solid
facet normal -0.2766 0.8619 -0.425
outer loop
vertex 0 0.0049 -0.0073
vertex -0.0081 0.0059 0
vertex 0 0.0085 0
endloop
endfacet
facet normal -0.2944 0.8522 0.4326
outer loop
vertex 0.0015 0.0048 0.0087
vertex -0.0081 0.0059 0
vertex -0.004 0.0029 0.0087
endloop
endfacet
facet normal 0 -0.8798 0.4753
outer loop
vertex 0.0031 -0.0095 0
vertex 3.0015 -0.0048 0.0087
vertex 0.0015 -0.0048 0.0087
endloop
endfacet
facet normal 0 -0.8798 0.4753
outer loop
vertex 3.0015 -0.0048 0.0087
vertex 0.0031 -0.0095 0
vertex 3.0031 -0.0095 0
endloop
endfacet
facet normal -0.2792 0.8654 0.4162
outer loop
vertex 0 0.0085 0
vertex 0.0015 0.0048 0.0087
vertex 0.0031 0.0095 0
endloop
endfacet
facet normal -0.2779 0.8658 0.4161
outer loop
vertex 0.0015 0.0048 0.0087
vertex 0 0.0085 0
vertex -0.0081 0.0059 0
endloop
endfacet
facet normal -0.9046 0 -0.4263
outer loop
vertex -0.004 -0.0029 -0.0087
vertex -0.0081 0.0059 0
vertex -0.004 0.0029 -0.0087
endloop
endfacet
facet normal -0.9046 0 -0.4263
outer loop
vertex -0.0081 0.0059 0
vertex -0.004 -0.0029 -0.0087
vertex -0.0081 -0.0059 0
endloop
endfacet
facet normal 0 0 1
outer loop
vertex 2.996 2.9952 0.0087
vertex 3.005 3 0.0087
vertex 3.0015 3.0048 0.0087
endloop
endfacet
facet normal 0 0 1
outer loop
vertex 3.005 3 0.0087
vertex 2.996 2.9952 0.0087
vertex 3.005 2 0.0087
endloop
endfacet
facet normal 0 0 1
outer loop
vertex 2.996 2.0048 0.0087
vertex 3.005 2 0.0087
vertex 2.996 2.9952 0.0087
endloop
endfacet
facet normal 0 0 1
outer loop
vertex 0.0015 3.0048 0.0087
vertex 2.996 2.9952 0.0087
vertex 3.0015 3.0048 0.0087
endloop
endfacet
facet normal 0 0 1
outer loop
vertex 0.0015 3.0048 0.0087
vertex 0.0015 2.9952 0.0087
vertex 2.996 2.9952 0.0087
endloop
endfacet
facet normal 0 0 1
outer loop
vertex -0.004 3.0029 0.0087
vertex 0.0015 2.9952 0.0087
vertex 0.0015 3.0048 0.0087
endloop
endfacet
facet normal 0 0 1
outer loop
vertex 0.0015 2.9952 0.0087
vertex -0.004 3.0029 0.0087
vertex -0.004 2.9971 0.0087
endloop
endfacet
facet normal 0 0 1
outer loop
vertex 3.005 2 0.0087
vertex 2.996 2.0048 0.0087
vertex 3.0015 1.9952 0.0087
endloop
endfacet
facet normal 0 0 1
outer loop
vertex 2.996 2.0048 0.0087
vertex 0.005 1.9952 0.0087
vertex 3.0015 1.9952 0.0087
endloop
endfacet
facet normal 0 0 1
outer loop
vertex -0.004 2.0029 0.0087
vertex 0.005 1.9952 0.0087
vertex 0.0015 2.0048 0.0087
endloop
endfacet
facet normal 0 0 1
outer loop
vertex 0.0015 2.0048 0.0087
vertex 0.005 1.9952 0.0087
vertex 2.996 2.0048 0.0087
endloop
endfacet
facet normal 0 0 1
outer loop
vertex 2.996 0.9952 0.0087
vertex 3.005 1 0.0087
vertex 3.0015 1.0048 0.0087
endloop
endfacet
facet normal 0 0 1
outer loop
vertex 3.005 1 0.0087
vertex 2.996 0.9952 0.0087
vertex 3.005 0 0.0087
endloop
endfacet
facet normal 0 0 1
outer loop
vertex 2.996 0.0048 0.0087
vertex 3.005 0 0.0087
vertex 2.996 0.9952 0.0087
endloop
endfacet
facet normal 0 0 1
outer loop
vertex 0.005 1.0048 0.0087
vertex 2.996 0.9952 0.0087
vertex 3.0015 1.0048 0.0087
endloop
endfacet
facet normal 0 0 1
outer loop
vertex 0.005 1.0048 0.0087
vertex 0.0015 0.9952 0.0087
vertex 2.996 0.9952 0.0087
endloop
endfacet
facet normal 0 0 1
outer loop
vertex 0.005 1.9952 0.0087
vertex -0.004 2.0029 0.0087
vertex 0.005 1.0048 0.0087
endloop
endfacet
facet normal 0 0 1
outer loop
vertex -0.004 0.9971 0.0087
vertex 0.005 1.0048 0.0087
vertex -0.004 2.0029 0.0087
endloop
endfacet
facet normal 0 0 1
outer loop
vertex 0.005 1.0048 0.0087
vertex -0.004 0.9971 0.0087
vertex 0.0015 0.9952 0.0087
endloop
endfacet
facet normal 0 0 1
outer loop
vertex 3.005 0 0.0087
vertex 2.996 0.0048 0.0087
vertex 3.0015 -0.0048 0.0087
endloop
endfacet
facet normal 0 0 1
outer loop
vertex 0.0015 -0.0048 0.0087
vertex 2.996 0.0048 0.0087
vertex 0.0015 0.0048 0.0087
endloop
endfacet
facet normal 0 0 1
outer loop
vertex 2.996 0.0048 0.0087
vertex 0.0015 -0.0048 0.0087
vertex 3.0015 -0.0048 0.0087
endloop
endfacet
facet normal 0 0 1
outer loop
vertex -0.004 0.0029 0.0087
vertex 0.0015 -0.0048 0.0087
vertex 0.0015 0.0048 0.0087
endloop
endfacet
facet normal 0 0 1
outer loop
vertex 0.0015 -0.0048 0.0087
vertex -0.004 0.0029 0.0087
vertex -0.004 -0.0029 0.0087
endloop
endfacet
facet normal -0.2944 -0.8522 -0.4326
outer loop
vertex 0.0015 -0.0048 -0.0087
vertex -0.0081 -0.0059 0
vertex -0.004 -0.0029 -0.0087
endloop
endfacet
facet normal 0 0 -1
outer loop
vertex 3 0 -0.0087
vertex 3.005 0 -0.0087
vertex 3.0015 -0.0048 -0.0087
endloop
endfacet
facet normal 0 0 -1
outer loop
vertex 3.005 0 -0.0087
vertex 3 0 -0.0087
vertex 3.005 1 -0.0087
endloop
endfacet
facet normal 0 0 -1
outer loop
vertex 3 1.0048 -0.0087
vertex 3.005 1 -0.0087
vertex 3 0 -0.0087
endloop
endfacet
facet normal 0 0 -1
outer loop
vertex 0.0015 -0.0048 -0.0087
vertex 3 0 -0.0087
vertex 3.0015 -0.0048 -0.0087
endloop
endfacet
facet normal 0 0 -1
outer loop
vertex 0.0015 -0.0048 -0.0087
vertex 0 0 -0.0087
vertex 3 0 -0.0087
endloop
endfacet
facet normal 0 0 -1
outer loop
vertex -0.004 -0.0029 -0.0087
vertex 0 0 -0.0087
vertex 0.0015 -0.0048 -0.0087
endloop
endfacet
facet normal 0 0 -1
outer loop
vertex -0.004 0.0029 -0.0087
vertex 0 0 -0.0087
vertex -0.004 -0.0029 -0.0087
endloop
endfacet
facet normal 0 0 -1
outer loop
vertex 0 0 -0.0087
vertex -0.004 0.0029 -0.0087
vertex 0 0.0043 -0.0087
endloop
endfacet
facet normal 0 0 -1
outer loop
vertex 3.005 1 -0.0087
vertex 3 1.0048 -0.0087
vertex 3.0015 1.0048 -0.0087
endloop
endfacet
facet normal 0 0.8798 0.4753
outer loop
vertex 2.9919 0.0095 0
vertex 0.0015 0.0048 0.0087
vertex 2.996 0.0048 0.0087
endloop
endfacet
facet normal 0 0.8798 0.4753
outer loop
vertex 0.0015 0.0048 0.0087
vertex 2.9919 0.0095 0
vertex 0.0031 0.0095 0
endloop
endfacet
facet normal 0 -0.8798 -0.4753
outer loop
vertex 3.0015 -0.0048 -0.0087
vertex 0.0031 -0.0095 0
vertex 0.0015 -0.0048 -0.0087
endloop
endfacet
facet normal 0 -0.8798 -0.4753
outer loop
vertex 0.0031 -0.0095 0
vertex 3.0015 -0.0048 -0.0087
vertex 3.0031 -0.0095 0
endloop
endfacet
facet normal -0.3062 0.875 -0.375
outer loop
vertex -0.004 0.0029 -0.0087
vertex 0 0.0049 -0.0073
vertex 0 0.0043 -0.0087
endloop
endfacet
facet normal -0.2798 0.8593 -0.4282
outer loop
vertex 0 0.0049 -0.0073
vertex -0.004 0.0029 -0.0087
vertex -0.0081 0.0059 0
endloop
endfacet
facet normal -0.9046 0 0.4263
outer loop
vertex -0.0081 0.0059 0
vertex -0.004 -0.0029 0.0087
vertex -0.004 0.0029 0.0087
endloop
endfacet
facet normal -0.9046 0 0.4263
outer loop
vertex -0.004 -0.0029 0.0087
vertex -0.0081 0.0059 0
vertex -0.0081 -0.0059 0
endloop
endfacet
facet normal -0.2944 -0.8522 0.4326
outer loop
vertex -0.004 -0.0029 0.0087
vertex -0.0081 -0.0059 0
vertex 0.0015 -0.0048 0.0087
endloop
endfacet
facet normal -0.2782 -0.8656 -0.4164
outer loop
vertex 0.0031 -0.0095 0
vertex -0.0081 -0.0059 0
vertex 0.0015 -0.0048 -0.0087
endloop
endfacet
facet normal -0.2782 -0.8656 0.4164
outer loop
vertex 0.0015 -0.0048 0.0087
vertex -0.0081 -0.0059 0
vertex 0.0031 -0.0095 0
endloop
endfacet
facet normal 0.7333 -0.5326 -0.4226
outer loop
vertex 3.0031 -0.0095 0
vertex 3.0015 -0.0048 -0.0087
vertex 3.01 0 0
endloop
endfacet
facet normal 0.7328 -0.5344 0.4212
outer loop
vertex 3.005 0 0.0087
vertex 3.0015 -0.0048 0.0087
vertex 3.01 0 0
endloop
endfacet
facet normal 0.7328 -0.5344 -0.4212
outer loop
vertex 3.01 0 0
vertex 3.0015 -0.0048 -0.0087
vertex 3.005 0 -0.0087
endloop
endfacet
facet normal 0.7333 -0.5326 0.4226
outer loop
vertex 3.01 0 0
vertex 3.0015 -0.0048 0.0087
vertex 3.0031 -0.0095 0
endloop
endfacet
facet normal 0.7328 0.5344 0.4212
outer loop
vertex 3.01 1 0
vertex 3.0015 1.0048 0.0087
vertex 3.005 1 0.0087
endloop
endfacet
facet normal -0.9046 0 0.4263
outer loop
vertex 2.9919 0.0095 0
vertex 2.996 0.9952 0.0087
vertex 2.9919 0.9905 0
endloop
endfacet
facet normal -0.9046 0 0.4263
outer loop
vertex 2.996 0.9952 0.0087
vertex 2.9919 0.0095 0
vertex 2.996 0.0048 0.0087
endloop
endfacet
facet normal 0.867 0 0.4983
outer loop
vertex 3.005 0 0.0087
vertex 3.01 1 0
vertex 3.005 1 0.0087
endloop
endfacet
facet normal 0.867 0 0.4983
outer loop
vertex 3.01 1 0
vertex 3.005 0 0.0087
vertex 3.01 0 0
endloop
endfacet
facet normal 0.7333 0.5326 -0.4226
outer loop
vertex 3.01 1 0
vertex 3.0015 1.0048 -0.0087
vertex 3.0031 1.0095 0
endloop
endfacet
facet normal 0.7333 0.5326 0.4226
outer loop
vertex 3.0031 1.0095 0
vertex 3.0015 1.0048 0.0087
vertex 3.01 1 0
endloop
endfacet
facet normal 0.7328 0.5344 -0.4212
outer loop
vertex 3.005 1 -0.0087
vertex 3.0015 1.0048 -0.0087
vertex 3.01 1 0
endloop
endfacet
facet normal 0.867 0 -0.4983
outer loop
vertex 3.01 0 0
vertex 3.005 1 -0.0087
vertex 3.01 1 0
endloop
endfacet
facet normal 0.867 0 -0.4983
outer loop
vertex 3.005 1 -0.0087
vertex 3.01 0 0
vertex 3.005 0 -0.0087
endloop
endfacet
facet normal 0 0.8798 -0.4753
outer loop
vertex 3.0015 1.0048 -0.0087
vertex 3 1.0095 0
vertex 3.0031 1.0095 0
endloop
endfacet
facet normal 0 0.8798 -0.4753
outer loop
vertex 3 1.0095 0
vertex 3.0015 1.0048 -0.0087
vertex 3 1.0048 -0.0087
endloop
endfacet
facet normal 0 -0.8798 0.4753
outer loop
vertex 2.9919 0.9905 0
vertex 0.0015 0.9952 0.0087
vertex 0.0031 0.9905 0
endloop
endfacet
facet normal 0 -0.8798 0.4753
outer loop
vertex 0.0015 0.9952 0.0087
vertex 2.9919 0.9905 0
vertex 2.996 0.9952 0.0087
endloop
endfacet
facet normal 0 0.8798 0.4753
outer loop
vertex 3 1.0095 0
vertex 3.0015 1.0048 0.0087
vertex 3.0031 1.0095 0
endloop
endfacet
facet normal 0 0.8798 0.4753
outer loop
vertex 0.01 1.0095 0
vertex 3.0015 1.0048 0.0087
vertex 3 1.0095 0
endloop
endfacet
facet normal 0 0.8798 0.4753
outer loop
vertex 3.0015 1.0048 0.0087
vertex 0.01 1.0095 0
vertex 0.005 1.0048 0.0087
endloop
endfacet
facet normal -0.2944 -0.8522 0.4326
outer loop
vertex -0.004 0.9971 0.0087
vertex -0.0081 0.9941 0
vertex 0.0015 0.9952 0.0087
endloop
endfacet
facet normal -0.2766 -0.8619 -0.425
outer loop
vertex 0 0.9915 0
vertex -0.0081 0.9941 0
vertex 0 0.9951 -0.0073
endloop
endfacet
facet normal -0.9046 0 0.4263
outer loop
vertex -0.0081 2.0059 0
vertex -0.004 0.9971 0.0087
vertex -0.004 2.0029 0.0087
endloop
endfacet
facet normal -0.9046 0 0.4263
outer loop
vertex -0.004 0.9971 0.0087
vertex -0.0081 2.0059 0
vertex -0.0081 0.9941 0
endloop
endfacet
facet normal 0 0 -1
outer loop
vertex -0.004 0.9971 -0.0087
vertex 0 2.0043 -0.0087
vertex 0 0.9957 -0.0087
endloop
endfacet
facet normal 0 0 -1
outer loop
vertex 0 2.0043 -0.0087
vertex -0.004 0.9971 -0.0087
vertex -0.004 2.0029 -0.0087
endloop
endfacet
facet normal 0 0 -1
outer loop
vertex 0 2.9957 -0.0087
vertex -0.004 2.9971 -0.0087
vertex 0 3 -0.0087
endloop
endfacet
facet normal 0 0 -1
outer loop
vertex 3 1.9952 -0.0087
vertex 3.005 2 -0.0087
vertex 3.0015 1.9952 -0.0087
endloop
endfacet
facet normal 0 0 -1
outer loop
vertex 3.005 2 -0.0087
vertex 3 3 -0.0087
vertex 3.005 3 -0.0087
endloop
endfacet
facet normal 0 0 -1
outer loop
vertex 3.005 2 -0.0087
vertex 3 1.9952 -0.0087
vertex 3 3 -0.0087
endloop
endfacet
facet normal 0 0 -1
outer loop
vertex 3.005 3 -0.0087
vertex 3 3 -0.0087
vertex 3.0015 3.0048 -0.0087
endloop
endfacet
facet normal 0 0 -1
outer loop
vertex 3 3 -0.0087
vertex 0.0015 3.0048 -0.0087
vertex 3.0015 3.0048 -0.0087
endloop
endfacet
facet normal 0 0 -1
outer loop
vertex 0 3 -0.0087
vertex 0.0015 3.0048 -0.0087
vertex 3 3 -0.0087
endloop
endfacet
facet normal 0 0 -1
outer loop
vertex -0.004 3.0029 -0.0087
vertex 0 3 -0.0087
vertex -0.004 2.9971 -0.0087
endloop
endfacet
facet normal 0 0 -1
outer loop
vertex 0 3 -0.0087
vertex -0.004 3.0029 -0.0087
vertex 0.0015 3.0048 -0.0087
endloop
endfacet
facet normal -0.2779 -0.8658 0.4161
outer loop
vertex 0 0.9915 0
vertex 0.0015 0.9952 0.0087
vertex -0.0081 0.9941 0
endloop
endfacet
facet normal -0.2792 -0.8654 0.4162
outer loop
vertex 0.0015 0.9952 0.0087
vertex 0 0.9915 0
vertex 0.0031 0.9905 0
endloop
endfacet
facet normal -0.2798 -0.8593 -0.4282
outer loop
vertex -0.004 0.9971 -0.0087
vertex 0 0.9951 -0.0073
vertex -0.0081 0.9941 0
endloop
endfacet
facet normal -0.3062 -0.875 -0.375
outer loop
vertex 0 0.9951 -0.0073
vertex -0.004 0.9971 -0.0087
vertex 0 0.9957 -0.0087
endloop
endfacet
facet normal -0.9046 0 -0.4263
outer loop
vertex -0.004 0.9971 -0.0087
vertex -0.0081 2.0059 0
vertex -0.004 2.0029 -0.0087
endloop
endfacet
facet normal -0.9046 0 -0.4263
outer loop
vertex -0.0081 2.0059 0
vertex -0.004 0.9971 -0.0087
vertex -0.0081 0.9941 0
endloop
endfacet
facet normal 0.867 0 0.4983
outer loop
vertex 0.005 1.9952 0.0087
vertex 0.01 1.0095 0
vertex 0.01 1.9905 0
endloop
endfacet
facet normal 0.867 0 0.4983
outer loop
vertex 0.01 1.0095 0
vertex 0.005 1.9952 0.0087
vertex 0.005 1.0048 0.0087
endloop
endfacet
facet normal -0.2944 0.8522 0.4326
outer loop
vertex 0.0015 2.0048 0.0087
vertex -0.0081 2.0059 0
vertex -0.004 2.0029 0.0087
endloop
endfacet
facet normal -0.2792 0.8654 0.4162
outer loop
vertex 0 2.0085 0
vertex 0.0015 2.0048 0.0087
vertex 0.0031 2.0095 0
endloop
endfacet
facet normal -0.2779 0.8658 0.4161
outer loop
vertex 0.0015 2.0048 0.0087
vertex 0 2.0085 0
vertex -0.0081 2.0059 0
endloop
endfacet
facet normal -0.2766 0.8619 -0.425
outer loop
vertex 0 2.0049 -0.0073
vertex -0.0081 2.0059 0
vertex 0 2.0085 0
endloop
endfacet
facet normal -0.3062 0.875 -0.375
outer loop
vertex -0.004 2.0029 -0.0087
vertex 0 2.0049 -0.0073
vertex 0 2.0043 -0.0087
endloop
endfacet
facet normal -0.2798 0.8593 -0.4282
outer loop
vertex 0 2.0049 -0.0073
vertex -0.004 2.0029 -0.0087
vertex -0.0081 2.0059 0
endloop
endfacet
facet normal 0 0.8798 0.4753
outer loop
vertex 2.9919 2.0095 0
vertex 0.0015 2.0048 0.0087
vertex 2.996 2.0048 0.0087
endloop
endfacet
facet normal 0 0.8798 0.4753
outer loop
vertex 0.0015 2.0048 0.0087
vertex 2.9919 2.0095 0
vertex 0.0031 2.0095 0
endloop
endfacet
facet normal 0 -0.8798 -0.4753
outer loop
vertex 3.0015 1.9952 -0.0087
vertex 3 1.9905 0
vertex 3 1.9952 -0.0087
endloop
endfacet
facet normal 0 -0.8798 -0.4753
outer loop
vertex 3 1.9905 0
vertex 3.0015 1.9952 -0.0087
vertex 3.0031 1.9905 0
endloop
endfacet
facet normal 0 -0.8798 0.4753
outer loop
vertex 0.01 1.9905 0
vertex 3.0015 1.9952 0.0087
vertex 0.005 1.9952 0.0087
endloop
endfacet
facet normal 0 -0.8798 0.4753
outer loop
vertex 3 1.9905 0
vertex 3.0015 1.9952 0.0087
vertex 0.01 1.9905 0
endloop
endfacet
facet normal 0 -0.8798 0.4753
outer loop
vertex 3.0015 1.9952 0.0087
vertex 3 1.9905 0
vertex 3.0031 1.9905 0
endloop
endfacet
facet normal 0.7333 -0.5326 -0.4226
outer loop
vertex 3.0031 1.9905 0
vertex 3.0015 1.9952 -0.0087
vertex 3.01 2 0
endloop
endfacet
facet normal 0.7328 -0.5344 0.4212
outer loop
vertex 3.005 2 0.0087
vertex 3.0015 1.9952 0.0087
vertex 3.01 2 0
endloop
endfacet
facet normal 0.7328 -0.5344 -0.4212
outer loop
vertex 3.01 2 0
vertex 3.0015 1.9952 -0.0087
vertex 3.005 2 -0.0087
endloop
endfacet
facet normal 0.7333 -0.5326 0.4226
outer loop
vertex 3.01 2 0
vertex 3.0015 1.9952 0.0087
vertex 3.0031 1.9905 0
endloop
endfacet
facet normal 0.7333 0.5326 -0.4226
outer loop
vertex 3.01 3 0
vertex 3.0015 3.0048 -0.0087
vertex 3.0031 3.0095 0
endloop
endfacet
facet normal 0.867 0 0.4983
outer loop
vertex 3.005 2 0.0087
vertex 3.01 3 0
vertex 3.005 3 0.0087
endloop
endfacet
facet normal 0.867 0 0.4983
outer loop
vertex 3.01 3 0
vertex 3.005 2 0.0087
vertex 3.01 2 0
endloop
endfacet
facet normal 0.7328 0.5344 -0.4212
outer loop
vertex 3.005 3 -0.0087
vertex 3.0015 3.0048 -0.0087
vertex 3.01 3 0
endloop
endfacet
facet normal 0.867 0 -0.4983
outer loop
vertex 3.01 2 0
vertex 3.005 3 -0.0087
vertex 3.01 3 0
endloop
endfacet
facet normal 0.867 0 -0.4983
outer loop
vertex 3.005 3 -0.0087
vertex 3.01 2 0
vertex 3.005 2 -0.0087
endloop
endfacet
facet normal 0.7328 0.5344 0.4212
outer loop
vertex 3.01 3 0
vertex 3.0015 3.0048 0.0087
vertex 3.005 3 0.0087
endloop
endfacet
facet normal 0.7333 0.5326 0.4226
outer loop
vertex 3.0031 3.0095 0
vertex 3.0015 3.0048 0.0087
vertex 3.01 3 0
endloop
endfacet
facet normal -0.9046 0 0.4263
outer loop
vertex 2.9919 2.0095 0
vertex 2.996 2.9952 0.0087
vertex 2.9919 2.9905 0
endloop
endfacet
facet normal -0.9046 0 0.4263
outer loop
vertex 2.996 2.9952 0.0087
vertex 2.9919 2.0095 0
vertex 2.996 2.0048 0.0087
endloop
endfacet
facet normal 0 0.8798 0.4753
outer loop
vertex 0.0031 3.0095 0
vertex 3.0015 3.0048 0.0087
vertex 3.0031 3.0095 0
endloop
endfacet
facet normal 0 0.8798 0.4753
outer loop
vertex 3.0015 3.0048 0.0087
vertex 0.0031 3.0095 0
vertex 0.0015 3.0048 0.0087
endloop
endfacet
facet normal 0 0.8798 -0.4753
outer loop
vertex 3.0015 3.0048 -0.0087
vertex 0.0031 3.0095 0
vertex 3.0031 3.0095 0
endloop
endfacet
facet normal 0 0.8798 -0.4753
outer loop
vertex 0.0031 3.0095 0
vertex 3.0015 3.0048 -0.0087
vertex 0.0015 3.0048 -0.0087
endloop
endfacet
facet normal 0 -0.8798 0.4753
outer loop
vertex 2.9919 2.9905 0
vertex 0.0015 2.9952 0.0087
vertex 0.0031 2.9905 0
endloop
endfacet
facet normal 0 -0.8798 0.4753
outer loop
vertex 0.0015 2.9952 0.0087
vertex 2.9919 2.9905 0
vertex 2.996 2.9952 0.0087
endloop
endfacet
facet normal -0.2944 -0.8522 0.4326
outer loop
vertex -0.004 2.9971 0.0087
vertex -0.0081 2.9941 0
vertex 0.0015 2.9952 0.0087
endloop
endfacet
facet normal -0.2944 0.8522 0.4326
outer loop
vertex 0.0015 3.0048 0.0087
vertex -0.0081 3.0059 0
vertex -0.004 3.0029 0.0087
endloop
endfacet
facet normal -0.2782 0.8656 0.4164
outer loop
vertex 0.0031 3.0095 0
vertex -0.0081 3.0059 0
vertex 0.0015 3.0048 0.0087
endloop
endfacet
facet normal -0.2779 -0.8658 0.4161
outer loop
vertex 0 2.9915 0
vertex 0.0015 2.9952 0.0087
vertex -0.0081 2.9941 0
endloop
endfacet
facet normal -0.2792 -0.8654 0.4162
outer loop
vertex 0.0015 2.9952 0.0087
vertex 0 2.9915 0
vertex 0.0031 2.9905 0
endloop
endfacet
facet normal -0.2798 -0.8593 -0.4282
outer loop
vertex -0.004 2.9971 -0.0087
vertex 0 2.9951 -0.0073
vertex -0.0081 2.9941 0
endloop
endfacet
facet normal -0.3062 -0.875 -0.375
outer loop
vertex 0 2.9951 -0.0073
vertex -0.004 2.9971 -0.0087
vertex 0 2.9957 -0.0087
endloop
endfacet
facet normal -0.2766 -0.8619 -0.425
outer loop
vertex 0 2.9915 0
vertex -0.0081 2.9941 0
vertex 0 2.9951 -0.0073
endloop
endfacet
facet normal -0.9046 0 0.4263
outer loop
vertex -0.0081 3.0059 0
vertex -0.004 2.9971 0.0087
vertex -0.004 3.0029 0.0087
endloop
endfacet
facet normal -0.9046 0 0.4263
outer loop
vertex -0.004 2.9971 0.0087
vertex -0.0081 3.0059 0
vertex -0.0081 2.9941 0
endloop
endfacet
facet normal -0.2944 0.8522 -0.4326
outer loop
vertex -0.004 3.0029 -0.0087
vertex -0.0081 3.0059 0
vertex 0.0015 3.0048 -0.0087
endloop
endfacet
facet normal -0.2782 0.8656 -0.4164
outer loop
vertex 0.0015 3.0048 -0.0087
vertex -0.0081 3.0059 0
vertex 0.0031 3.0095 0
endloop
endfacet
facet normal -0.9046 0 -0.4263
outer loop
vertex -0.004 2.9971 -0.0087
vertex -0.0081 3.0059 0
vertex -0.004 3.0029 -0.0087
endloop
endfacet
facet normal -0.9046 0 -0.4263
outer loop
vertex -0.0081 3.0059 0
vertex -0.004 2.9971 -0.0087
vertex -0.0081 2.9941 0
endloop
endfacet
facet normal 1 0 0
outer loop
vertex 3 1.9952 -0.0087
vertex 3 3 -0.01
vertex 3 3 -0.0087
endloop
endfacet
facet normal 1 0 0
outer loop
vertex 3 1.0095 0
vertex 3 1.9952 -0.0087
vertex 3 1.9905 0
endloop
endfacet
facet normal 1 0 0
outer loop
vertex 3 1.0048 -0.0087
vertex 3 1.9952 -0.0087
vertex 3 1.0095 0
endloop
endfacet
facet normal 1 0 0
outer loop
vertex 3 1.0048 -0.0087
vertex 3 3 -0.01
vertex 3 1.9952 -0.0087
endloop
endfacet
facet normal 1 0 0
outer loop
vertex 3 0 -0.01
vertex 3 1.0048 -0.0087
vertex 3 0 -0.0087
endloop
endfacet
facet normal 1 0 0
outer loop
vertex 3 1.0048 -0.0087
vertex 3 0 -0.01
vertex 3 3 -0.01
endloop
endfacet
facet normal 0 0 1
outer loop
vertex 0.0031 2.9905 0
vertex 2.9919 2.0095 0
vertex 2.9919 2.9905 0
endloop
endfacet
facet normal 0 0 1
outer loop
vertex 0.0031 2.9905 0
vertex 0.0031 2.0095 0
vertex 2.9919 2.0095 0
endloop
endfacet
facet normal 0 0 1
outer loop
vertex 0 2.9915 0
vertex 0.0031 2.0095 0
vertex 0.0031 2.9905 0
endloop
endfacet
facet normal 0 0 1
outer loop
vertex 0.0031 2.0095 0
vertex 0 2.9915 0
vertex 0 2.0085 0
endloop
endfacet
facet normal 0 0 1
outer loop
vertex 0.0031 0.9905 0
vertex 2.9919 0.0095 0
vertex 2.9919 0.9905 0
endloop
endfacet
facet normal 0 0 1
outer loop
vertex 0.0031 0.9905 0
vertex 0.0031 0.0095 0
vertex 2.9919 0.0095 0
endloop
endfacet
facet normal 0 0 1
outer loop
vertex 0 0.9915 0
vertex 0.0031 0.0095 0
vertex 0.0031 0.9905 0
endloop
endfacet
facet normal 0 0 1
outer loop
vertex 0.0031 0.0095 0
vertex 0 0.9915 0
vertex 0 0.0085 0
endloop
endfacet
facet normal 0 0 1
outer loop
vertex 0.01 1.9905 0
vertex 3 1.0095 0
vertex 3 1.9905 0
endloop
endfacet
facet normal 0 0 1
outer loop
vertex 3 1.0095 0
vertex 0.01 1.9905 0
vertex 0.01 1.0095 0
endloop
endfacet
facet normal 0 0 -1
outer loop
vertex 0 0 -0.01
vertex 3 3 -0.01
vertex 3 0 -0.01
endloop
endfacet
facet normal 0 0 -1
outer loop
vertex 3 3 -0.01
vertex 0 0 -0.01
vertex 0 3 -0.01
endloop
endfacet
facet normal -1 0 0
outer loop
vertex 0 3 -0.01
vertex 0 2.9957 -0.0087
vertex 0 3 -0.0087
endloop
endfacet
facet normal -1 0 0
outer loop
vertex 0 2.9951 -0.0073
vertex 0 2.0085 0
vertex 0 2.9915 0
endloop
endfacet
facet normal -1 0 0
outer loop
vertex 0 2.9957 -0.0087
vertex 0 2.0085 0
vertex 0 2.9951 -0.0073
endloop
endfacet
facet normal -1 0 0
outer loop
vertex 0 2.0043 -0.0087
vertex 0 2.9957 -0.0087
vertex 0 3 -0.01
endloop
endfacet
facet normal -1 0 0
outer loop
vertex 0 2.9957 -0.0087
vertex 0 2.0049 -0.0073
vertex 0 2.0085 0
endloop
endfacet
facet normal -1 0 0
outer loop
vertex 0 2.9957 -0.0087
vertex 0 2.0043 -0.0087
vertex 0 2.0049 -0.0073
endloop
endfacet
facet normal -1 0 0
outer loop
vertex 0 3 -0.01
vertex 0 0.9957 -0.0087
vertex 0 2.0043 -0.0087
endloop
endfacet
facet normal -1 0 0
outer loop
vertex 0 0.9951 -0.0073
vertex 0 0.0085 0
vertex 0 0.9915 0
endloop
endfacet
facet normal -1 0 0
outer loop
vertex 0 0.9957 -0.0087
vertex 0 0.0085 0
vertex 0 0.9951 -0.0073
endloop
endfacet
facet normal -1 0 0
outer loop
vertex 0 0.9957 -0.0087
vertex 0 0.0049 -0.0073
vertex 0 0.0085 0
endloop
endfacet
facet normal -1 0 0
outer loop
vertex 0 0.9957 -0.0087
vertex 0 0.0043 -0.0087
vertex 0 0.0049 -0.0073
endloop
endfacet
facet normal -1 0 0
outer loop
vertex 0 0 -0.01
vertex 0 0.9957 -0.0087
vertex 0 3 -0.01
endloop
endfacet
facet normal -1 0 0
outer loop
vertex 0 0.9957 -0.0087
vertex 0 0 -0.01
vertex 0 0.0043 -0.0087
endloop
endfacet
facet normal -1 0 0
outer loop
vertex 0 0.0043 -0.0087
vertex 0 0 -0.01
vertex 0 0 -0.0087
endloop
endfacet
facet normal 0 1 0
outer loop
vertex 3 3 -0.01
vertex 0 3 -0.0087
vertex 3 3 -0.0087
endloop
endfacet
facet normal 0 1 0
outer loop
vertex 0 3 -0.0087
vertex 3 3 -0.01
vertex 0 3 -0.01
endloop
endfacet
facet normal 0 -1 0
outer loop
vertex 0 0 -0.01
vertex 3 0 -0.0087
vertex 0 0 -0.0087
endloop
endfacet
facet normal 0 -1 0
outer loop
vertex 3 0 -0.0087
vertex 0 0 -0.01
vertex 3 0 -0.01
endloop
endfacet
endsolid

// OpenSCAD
hull(){
    translate([0, 0]) sphere(0.01);
    translate([1, 0]) sphere(0.01);
}
hull(){
    translate([1, 0]) sphere(0.01);
    translate([2, 0]) sphere(0.01);
}
hull(){
    translate([2, 0]) sphere(0.01);
    translate([3, 0]) sphere(0.01);
}
hull(){
    translate([3, 0]) sphere(0.01);
    translate([3, 1]) sphere(0.01);
}
hull(){
    translate([3, 1]) sphere(0.01);
    translate([2, 1]) sphere(0.01);
}
hull(){
    translate([2, 1]) sphere(0.01);
    translate([1, 1]) sphere(0.01);
}
hull(){
    translate([1, 1]) sphere(0.01);
    translate([0, 1]) sphere(0.01);
}
hull(){
    translate([0, 1]) sphere(0.01);
    translate([0, 2]) sphere(0.01);
}
hull(){
    translate([0, 2]) sphere(0.01);
    translate([1, 2]) sphere(0.01);
}
hull(){
    translate([1, 2]) sphere(0.01);
    translate([2, 2]) sphere(0.01);
}
hull(){
    translate([2, 2]) sphere(0.01);
    translate([3, 2]) sphere(0.01);
}
hull(){
    translate([3, 2]) sphere(0.01);
    translate([3, 3]) sphere(0.01);
}
hull(){
    translate([3, 3]) sphere(0.01);
    translate([2, 3]) sphere(0.01);
}
hull(){
    translate([2, 3]) sphere(0.01);
    translate([1, 3]) sphere(0.01);
}
hull(){
    translate([1, 3]) sphere(0.01);
    translate([0, 3]) sphere(0.01);
}
translate([0,0,-0.01]) color([0.1,0.1,0.1]) cube([3,3,0.01]);
